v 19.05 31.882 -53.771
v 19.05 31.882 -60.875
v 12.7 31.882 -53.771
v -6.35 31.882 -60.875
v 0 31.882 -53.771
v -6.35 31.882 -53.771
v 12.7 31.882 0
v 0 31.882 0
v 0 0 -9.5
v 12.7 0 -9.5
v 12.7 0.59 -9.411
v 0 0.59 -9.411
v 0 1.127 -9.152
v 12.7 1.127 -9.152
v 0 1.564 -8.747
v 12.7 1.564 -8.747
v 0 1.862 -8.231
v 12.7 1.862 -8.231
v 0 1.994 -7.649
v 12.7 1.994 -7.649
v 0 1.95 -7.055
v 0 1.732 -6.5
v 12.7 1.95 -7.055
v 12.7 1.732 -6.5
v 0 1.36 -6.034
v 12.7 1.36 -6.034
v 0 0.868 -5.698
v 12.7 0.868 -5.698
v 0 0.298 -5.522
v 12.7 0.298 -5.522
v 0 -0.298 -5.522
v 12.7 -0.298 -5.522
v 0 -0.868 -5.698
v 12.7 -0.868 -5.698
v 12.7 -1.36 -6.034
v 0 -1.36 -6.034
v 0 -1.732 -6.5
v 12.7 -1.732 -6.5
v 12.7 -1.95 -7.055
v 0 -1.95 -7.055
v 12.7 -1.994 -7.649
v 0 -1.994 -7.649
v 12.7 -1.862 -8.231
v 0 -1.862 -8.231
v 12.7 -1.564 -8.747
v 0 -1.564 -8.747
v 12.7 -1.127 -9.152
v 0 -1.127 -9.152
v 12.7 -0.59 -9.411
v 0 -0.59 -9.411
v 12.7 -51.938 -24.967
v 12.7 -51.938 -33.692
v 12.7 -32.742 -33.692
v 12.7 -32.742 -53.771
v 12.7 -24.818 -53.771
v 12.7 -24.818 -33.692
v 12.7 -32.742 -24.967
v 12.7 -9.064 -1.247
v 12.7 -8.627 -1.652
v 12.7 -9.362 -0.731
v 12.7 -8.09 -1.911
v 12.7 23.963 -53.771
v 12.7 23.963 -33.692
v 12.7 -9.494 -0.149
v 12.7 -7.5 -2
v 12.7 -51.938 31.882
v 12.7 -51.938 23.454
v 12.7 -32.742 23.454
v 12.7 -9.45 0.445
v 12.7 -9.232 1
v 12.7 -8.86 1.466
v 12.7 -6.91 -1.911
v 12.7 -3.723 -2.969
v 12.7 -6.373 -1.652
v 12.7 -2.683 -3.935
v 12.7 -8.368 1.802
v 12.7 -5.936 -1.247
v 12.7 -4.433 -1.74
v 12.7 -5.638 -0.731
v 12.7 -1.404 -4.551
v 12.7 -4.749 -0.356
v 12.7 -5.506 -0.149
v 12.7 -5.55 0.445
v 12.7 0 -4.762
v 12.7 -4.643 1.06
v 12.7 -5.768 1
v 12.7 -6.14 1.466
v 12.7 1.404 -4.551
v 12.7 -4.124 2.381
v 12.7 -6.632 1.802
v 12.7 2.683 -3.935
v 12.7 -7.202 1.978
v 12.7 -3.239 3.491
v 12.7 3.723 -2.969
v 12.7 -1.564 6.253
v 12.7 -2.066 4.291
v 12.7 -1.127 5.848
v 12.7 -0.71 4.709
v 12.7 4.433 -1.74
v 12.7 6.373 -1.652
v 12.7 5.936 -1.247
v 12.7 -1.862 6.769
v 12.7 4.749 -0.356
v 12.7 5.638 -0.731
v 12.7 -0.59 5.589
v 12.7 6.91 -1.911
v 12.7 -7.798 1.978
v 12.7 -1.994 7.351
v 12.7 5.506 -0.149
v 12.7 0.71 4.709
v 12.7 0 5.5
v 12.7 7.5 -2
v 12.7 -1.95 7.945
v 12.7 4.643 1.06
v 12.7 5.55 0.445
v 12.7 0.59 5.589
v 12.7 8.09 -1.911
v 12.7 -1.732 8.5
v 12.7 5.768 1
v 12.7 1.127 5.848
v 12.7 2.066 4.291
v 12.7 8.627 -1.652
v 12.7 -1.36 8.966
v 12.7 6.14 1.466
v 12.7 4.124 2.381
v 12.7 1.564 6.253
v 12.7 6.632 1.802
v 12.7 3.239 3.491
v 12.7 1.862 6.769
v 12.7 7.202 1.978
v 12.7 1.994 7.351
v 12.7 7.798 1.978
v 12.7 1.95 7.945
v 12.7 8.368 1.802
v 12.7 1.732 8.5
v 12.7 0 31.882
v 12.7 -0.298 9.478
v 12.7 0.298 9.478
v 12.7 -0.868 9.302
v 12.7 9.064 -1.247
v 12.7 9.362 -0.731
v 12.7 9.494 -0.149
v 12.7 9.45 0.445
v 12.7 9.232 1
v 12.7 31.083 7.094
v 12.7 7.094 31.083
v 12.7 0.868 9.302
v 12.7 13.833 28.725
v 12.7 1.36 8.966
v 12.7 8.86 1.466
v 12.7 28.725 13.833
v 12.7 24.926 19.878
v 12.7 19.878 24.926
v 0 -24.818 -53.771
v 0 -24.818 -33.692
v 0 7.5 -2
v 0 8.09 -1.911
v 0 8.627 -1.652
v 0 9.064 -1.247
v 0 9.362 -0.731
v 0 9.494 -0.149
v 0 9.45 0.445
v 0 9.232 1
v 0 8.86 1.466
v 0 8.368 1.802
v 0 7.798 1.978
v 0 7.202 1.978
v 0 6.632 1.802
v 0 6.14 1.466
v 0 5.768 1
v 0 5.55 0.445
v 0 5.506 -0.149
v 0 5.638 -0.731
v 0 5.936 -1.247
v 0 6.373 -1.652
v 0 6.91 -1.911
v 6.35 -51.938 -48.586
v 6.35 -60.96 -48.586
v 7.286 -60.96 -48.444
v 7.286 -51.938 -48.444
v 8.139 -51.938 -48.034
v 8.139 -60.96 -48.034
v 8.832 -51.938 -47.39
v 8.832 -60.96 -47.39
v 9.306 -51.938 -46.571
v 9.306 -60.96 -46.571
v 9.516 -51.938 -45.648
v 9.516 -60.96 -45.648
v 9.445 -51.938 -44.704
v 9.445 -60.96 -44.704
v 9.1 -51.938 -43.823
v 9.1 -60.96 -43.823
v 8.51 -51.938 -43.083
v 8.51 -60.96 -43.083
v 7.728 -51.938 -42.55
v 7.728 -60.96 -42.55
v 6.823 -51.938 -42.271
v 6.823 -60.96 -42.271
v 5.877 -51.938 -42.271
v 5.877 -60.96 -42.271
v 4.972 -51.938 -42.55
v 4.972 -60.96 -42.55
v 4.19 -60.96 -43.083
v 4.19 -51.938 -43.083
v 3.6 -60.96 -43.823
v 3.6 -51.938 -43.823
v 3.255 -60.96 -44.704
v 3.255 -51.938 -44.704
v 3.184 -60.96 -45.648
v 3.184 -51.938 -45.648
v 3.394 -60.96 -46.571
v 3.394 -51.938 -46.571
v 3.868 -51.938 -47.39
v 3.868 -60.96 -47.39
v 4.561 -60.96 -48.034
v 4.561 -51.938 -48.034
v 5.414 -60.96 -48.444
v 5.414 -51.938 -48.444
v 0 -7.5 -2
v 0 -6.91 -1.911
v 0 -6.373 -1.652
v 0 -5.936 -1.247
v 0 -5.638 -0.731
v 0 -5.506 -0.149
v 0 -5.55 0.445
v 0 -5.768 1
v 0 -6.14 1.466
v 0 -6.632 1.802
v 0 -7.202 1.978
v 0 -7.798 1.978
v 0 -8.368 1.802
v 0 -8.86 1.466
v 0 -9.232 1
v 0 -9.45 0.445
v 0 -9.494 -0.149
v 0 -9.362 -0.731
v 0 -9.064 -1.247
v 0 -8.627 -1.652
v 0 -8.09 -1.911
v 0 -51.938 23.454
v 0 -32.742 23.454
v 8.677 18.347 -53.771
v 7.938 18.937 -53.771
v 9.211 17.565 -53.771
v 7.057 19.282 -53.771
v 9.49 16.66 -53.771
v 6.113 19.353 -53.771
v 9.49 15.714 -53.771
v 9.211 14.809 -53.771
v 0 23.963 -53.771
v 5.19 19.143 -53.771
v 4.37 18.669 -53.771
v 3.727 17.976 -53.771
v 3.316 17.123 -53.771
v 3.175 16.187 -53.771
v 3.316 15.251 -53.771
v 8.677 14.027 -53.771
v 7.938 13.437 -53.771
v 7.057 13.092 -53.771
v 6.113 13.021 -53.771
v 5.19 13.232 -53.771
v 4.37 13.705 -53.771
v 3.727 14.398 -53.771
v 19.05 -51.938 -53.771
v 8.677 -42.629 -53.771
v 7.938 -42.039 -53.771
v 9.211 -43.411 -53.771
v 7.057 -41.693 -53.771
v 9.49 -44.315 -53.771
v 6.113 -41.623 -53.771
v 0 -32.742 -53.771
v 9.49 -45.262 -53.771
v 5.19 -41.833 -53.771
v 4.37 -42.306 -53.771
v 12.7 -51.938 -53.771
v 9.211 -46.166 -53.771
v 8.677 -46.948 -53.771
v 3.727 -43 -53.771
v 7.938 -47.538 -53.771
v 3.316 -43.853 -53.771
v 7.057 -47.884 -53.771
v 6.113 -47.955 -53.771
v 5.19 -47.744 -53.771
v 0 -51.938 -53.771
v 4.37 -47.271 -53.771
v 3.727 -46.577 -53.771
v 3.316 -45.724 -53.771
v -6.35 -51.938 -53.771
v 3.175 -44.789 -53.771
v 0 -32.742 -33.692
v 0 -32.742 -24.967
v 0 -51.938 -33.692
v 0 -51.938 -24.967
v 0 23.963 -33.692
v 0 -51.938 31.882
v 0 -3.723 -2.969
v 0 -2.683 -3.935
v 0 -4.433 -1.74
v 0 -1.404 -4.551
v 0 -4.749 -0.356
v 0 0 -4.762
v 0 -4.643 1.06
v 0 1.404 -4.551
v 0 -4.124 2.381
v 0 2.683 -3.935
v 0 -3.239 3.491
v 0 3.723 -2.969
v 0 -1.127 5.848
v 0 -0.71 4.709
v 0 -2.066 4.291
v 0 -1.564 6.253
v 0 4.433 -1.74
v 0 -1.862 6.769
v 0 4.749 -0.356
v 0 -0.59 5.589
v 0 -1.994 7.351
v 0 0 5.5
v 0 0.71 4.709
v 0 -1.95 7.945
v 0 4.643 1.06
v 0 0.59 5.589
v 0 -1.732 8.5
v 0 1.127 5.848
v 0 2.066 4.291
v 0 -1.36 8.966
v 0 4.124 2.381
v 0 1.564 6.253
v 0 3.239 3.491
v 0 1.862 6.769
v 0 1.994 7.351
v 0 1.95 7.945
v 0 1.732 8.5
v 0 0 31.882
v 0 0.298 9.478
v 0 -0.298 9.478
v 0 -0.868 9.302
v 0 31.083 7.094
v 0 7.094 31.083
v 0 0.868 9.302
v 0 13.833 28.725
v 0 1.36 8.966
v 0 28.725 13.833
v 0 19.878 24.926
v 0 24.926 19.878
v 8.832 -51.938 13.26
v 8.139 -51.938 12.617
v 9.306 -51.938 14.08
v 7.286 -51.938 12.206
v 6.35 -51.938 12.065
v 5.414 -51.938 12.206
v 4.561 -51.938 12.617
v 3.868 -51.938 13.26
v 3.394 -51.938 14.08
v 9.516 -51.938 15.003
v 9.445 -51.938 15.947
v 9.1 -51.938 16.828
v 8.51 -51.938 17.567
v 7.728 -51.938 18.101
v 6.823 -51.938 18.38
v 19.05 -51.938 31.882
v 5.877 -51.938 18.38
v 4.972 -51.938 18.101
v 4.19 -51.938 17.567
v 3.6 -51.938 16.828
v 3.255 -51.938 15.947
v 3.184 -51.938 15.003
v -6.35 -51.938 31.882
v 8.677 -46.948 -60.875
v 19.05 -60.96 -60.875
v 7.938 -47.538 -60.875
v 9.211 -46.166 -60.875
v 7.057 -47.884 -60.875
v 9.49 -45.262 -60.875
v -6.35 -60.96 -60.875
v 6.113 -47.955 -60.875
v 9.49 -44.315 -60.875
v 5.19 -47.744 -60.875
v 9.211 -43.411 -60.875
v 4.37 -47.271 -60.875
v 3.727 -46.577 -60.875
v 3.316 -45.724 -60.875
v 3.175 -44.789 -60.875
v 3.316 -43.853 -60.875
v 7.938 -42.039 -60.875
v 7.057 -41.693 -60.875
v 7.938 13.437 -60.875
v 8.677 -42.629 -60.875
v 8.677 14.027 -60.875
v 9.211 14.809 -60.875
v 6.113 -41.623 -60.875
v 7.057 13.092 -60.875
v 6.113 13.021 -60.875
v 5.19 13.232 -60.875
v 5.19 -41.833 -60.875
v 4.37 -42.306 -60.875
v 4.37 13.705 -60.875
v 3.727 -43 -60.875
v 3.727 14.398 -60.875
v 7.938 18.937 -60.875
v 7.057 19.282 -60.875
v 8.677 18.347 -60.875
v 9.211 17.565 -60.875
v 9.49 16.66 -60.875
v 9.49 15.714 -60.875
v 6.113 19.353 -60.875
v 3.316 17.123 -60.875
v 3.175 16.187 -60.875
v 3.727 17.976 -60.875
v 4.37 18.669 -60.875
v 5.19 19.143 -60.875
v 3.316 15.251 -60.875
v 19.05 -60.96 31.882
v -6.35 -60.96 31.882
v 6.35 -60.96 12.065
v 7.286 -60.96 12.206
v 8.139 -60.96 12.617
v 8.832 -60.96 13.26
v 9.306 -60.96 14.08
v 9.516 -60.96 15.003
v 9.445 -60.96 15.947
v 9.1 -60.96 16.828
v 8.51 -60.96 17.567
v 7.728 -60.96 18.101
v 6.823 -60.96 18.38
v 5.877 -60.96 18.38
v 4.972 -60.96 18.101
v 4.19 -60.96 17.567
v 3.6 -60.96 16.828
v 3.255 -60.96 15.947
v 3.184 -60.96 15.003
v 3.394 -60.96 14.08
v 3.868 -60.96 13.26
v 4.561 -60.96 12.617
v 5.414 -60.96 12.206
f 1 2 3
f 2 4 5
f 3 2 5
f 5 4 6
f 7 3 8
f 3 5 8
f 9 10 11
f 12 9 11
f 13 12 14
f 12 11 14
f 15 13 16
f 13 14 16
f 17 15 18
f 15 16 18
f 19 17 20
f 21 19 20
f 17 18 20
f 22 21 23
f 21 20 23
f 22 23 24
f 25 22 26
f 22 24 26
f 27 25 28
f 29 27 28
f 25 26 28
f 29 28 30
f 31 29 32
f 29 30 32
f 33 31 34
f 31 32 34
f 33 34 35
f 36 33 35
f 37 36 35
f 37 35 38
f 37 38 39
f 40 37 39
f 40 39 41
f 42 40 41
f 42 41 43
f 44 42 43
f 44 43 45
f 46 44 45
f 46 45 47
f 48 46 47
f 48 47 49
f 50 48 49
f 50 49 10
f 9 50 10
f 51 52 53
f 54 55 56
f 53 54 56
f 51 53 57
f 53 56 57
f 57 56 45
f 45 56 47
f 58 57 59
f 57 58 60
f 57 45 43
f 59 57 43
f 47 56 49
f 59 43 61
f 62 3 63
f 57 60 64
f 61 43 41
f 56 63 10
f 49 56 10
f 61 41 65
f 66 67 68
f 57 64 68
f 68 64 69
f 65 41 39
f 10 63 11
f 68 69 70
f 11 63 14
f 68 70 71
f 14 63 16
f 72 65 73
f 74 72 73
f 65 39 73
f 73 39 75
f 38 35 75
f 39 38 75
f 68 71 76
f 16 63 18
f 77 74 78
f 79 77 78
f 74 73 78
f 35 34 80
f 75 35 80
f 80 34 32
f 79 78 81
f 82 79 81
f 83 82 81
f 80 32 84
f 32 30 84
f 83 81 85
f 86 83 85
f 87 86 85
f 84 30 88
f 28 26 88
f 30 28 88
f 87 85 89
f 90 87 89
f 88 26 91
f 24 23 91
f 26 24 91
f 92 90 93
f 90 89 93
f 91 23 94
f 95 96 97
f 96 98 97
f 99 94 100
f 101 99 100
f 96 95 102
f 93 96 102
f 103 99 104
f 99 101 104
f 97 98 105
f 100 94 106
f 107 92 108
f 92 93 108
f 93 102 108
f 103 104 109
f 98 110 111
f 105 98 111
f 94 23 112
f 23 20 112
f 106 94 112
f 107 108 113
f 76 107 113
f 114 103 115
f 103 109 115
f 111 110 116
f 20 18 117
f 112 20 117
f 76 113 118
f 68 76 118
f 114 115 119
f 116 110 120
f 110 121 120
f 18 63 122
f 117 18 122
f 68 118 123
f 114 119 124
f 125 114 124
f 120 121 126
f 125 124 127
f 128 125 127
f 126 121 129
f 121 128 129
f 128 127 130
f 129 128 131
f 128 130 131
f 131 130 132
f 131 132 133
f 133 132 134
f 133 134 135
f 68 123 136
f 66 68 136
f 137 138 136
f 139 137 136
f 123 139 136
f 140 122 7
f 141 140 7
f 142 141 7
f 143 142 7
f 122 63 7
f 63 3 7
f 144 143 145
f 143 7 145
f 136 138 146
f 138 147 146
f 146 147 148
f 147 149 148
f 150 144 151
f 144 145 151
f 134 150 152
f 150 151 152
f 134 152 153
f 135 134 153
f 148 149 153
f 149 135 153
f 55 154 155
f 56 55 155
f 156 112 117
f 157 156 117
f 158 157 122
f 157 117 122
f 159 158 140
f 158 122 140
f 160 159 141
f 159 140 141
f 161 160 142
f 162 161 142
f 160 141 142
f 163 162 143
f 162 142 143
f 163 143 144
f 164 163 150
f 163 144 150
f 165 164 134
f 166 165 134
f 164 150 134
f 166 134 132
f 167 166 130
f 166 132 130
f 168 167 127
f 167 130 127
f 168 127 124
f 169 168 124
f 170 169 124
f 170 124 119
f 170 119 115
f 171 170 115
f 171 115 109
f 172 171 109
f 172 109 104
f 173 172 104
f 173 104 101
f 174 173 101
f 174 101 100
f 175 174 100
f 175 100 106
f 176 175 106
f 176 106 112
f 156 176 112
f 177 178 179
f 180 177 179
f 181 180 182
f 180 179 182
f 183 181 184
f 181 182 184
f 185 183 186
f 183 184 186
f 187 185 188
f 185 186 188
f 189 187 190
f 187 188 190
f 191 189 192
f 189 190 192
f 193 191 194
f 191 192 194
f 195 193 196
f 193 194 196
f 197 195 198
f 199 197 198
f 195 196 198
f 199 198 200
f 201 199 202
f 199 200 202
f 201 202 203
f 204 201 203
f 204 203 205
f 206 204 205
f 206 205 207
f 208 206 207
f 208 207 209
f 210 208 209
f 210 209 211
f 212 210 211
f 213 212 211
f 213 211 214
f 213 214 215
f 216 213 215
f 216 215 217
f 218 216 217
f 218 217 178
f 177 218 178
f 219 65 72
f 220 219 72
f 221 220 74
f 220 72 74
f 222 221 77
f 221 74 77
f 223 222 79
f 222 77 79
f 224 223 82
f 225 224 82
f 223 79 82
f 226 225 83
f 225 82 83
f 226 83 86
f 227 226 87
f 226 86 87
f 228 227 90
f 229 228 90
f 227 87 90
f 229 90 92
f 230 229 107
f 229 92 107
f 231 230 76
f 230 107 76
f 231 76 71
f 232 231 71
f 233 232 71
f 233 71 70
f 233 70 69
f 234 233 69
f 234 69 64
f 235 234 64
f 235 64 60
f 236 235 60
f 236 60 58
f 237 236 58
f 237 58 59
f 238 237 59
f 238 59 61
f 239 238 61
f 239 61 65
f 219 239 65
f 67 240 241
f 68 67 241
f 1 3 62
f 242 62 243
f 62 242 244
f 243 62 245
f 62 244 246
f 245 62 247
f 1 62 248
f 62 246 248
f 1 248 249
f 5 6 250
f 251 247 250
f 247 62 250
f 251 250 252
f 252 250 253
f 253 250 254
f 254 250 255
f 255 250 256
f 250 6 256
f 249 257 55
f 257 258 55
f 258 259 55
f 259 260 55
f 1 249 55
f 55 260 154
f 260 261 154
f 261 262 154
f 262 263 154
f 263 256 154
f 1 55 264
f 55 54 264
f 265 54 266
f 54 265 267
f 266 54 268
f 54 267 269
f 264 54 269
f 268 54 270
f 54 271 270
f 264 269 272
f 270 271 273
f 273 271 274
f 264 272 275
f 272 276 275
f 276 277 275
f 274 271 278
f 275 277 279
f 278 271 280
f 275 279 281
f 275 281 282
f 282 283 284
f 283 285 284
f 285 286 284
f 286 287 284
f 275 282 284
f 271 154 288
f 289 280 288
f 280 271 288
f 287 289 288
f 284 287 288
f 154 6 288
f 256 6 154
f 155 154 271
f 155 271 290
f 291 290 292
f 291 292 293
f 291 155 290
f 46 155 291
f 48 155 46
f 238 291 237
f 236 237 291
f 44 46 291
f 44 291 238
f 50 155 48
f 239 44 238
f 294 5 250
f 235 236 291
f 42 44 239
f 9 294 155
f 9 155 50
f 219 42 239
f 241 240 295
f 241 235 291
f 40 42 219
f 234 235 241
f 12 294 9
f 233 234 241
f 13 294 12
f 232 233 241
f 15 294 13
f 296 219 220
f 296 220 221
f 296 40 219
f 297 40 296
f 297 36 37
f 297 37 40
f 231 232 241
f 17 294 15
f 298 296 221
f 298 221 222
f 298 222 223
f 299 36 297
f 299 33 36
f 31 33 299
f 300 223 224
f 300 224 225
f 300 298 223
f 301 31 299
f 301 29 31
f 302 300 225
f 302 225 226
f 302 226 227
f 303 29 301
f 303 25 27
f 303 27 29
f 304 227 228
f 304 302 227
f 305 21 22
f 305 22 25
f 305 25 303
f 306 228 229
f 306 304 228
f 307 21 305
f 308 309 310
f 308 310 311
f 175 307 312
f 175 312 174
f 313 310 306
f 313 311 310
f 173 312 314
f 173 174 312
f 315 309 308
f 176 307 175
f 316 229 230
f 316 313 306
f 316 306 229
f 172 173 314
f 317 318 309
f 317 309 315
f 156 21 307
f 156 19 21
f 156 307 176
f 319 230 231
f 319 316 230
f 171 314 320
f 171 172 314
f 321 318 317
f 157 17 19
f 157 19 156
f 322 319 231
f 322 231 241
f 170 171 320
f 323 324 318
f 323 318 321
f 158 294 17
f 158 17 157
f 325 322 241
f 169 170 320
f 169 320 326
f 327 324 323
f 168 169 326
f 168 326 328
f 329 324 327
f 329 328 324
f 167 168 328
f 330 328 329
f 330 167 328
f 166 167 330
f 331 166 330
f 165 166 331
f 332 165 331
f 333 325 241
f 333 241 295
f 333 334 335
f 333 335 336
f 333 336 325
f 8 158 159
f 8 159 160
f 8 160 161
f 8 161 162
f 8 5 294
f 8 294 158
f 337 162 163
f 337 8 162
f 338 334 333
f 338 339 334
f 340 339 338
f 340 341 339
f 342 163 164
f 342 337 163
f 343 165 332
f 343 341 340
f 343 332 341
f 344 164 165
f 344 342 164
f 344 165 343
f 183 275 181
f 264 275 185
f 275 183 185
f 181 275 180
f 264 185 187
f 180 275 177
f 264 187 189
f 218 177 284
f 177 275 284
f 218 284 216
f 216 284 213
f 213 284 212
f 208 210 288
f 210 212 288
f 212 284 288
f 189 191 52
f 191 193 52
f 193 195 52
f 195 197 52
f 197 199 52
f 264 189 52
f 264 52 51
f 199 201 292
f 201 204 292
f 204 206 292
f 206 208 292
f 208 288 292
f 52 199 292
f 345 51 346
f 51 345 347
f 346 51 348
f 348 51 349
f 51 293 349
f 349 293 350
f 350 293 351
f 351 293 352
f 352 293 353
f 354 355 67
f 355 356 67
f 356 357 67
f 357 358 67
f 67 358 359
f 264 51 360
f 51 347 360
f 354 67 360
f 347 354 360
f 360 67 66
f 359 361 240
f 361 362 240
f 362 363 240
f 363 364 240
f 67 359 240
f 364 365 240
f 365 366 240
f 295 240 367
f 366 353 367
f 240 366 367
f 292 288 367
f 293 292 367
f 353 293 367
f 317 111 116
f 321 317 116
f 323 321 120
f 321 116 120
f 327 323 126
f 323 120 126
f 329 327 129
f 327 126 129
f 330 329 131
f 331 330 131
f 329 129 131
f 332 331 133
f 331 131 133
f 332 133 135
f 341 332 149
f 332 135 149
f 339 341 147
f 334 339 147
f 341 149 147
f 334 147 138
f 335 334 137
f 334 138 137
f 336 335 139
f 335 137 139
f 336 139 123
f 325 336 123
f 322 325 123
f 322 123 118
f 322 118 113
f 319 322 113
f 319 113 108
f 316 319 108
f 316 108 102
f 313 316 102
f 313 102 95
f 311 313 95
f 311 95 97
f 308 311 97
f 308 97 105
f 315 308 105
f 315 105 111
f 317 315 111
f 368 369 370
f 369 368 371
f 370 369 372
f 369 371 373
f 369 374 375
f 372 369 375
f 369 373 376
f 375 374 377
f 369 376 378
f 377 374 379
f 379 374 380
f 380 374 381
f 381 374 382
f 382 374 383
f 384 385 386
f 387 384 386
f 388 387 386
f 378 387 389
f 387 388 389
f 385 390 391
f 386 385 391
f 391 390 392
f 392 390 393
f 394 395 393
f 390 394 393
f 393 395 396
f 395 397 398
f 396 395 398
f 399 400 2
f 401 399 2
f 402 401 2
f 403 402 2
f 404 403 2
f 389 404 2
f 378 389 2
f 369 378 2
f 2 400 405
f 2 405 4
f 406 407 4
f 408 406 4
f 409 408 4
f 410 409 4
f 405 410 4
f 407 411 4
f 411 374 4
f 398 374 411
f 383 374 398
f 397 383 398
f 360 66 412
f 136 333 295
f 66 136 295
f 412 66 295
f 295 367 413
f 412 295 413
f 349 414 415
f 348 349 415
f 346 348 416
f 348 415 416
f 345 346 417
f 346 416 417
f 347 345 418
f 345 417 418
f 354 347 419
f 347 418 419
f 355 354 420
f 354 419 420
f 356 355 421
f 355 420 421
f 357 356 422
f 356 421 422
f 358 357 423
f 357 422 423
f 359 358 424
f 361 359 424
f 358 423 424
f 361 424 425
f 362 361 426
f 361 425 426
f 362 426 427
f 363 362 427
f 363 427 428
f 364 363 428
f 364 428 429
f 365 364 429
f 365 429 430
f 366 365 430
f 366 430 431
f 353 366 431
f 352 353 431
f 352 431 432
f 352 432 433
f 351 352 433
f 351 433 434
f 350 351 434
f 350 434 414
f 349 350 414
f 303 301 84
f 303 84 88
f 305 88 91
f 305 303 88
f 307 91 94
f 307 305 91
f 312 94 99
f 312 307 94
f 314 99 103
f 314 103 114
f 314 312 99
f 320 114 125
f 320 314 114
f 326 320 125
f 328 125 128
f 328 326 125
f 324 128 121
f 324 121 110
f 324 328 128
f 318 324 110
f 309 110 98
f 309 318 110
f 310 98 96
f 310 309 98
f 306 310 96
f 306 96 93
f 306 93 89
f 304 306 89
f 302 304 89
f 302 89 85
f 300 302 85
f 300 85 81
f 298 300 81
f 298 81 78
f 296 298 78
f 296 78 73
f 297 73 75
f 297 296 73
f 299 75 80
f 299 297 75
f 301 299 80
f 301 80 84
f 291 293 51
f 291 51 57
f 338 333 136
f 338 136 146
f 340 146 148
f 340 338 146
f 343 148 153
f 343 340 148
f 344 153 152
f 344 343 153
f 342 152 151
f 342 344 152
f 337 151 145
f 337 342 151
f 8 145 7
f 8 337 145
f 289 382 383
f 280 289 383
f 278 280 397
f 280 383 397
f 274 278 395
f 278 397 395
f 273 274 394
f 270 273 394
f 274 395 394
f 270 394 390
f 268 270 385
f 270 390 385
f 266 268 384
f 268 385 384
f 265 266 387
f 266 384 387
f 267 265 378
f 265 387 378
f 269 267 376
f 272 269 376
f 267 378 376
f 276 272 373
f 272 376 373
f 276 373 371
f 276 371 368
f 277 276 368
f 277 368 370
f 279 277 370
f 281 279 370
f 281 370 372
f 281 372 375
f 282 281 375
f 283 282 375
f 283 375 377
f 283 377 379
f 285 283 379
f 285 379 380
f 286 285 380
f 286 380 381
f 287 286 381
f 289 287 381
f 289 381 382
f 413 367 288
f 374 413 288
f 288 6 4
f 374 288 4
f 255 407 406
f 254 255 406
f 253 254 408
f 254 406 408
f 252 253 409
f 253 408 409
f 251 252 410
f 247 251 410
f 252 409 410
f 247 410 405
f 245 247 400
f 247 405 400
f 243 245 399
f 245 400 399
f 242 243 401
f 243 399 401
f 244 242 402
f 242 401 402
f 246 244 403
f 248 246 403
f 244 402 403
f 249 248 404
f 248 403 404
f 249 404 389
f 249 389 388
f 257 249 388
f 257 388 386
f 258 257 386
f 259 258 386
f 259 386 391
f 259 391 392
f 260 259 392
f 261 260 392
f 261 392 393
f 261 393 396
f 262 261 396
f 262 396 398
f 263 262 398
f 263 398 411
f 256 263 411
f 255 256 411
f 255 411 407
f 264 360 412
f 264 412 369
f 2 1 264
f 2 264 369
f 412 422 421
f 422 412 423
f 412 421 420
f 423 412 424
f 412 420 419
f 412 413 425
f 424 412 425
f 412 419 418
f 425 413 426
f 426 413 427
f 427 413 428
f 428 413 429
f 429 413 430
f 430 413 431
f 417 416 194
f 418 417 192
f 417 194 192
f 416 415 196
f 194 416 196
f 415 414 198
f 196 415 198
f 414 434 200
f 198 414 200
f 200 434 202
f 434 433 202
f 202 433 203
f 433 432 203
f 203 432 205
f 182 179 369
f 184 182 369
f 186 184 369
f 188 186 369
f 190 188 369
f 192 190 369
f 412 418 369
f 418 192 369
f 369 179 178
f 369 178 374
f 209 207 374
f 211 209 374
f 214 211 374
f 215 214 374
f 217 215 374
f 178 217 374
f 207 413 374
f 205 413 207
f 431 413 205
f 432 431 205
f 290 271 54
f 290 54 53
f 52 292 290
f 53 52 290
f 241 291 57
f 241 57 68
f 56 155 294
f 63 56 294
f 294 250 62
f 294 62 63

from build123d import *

# Parameters (mm, degrees)
SKETCH1_R                = 4.7625
BOSS_EXTRUDE1_DEPTH      = 12.7
BOSS_EXTRUDE2_DEPTH      = 6.35
BOSS_EXTRUDE2_DEPTH_BACK = 19.05
SKETCH4_W                = 20.078494948
SKETCH4_H                = 48.78095735
SKETCH4_W_2              = 48.420880553
SKETCH4_H_2              = 19.195923741
CUT_EXTRUDE2_DEPTH       = 26.162
SKETCH5_R                = 3.175
CUT_EXTRUDE3_DEPTH       = 11.43
SKETCH6_R                = 3.175
CUT_EXTRUDE4_DEPTH       = 11.43
SKETCH11_R               = 2
CUT_EXTRUDE7_DEPTH       = 21.844


with BuildPart() as part:
    # Sketch1 → Boss-Extrude1 (new body)
    with BuildSketch(Plane(origin=(0, 0, 0), x_dir=(0, 0, -1), z_dir=(1, 0, 0))):
        with BuildLine():
            Line((0, 31.882172919), (31.882172919, 31.882172919))
            Line((31.882172919, 31.882172919), (60.87463474, 31.882172919))
            Line((60.87463474, 31.882172919), (60.87463474, -60.96))
            Line((60.87463474, -60.96), (-31.882172919, -60.96))
            Line((-31.882172919, -60.96), (-31.882172919, 0))
            ThreePointArc((-31.882172919, 0), (-22.54410067, 22.54410067), (0, 31.882172919))
        make_face()
        Circle(SKETCH1_R, mode=Mode.SUBTRACT)
    extrude(amount=BOSS_EXTRUDE1_DEPTH)

    # Sketch8 → Boss-Extrude2 (add, two sides: drawn at the far end of the back side and taken through both)
    with BuildSketch(Plane(origin=(12.7, 0, 0), x_dir=(0, 0, -1), z_dir=(1, 0, 0)).offset(-BOSS_EXTRUDE2_DEPTH_BACK)):
        Polygon((60.87463474, 31.882172919), (53.770648903, 31.882172919), (53.770648903, -51.937867719), (-31.882172919, -51.937867719), (-31.882172919, -60.96), (53.770648903, -60.96), (60.87463474, -60.96), align=None)
    extrude(amount=BOSS_EXTRUDE2_DEPTH + BOSS_EXTRUDE2_DEPTH_BACK)

    # Sketch4 → Cut-Extrude2 (cut)
    with BuildSketch(Plane.ZY):
        with Locations((-43.731401429, -0.427222634)):
            Rectangle(SKETCH4_W, SKETCH4_H)
        with Locations((-0.75610861, -42.339905849)):
            Rectangle(SKETCH4_W_2, SKETCH4_H_2)
        with Locations((-43.731401429, -42.339905849)):
            Rectangle(SKETCH4_W, SKETCH4_H_2)
    extrude(amount=-CUT_EXTRUDE2_DEPTH, mode=Mode.SUBTRACT)

    # Sketch5 → Cut-Extrude3 (cut)
    with BuildSketch(Plane(origin=(0, 0, -60.87463474), x_dir=(-1, 0, 0), z_dir=(0, 0, -1))):
        with Locations((-6.35, 16.187024645)):
            Circle(SKETCH5_R)
        with Locations((-6.35, -44.788648077)):
            Circle(SKETCH5_R)
    extrude(amount=-CUT_EXTRUDE3_DEPTH, mode=Mode.SUBTRACT)

    # Sketch6 → Cut-Extrude4 (cut)
    with BuildSketch(Plane.XZ.offset(60.96)):
        with Locations((6.35, 15.24)):
            Circle(SKETCH6_R)
        with Locations((6.35, -45.41055385)):
            Circle(SKETCH6_R)
    extrude(amount=-CUT_EXTRUDE4_DEPTH, mode=Mode.SUBTRACT)

    # Sketch11 → Cut-Extrude7 (cut)
    with BuildSketch(Plane(origin=(12.7, 0, 0), x_dir=(0, 0, -1), z_dir=(1, 0, 0))):
        with Locations((7.5, 0)):
            Circle(SKETCH11_R)
        with Locations((0, -7.5)):
            Circle(SKETCH11_R)
        with Locations((-7.5, 0)):
            Circle(SKETCH11_R)
        with Locations((0, 7.5)):
            Circle(SKETCH11_R)
    extrude(amount=-CUT_EXTRUDE7_DEPTH, mode=Mode.SUBTRACT)


solid = part.part
